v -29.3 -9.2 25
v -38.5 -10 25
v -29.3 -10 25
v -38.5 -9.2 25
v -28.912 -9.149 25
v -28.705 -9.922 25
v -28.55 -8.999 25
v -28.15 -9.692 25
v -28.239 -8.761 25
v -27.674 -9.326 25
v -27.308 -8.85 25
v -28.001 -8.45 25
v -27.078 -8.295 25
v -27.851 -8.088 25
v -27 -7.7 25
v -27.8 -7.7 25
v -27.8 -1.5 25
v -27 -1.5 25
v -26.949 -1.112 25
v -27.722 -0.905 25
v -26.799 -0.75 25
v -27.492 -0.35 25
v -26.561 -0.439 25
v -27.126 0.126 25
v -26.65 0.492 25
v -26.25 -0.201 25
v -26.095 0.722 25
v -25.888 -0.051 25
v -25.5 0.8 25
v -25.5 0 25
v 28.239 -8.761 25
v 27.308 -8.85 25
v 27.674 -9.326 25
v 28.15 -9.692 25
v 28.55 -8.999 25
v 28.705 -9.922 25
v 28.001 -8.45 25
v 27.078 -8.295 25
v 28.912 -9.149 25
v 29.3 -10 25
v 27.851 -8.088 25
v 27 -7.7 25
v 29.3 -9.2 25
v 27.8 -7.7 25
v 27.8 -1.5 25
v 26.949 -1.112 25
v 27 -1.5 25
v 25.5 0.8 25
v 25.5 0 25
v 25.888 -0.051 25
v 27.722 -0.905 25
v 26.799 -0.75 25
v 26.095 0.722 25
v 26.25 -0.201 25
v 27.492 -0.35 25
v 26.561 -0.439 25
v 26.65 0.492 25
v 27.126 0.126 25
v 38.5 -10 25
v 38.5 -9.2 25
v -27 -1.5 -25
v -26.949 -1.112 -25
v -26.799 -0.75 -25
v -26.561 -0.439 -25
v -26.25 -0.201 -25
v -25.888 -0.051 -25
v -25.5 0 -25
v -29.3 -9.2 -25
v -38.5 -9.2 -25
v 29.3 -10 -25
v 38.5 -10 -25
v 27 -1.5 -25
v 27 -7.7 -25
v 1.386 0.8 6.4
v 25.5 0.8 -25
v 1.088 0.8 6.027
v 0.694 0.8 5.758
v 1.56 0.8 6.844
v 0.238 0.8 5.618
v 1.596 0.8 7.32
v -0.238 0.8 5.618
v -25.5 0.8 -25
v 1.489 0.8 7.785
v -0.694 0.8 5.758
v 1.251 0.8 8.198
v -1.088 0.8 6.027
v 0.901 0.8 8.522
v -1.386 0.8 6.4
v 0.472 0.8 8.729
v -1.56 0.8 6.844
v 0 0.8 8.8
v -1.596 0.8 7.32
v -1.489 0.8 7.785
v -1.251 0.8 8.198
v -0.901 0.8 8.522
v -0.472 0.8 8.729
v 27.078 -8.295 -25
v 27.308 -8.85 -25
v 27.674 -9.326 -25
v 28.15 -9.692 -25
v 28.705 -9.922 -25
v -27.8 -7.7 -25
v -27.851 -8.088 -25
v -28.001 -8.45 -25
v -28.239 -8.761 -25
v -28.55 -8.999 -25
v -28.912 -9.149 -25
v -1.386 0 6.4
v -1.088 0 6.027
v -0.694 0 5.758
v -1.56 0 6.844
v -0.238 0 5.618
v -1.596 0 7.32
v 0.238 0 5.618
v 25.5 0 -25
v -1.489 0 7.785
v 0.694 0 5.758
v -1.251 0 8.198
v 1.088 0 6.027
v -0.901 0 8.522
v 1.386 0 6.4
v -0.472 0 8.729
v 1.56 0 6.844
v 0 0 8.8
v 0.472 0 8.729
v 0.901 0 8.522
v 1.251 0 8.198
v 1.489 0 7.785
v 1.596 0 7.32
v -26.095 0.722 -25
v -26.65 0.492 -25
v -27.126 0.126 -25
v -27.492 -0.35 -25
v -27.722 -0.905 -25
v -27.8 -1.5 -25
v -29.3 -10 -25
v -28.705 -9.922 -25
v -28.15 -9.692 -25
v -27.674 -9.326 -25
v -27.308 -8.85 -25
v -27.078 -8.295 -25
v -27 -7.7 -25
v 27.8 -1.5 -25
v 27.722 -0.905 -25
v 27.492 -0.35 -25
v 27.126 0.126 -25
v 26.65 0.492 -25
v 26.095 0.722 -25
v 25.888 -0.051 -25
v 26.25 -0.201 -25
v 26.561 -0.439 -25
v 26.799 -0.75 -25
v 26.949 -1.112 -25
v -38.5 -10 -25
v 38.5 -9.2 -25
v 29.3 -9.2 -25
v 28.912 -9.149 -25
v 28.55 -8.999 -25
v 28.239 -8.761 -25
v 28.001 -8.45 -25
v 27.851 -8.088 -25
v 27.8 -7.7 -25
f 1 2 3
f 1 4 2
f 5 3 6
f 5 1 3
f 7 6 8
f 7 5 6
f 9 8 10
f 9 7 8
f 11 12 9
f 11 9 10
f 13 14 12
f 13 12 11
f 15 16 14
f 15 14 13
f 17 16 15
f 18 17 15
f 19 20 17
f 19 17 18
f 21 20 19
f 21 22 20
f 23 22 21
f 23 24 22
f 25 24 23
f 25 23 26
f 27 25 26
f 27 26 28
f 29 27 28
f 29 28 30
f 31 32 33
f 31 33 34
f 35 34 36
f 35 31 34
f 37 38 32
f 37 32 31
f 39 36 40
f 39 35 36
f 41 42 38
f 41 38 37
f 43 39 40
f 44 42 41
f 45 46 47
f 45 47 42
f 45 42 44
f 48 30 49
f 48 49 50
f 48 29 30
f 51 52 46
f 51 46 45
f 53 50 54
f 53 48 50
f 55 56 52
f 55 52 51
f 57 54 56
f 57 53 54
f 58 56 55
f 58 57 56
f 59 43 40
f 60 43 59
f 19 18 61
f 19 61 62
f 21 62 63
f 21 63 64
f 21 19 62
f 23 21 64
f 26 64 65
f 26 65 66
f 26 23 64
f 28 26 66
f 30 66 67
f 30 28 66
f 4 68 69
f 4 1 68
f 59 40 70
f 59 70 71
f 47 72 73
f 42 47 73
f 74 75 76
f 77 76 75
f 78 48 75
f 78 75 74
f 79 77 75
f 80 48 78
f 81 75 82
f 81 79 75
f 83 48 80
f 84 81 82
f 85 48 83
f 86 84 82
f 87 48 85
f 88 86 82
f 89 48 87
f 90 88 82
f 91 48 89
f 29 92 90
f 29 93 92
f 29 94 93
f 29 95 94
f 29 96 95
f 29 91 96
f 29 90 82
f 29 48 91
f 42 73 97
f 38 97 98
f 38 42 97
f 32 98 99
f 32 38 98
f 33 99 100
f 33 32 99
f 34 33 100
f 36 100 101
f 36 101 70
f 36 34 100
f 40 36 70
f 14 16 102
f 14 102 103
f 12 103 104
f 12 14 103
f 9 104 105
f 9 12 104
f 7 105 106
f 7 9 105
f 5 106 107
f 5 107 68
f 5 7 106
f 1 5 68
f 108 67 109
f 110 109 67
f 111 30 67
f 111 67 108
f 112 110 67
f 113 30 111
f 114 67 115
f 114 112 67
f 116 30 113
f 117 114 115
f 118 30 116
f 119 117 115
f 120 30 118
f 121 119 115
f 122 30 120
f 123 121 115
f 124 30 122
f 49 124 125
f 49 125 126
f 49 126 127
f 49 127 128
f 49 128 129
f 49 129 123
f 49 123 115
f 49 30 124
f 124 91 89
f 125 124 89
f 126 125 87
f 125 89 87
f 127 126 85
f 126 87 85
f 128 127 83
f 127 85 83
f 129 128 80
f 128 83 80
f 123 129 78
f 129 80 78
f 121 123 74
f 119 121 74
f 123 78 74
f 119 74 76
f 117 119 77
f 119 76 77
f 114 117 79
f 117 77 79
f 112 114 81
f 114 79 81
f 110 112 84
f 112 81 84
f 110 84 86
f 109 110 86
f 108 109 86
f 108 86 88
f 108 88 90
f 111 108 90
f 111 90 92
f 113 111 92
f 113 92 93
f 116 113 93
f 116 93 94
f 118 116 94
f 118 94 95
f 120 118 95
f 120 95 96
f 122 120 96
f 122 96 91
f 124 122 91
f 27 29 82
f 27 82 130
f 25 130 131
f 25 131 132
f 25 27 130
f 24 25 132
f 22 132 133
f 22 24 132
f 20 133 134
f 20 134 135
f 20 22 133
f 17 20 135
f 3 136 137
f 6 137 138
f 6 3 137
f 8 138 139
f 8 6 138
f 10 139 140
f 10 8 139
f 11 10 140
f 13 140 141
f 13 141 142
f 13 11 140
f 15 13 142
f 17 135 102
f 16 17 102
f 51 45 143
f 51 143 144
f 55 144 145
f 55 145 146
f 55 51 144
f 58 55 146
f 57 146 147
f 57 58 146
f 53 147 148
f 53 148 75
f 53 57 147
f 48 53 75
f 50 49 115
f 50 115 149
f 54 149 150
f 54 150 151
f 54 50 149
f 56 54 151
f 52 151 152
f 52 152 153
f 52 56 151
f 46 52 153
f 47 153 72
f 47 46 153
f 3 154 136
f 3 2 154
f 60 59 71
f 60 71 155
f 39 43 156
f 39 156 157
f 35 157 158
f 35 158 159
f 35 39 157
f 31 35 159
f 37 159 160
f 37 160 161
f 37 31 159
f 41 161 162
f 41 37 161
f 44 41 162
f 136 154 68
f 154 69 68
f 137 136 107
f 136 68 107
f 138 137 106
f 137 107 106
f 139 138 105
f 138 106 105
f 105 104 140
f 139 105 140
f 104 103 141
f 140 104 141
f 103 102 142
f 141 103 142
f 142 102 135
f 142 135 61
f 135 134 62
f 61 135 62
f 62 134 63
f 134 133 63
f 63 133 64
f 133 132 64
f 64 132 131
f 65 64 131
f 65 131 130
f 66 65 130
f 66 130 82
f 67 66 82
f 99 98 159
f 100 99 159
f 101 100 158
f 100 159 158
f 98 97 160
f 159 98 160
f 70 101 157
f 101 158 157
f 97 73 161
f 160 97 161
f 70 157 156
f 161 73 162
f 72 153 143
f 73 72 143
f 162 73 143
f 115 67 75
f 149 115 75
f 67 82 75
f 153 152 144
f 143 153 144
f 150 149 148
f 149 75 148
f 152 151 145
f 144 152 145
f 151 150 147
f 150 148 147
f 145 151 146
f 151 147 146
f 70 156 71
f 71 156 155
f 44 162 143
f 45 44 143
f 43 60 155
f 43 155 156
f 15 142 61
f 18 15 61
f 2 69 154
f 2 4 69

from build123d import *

# Parameters (mm, degrees)
BASE_FLANGE1_DEPTH = 25
SKETCH2_R          = 1.6
CUT_EXTRUDE1_DEPTH = 10


# Sheet-metal steps are written as plain solids
with BuildPart() as part:
    # Sketch1 → Base-Flange1 (new, symmetric)
    with BuildSketch(Plane.XY):
        with BuildLine():
            Line((-38.5, -10), (-29.3, -10))
            ThreePointArc((-29.3, -10), (-27.673654403, -9.326345597), (-27, -7.7))
            Line((-27, -7.7), (-27, -1.5))
            ThreePointArc((-27, -1.5), (-26.560660172, -0.439339828), (-25.5, 0))
            Line((-25.5, 0), (25.5, 0))
            ThreePointArc((25.5, 0), (26.560660172, -0.439339828), (27, -1.5))
            Line((27, -1.5), (27, -7.7))
            ThreePointArc((27, -7.7), (27.673654403, -9.326345597), (29.3, -10))
            Line((29.3, -10), (38.5, -10))
            Line((38.5, -10), (38.5, -9.2))
            Line((38.5, -9.2), (29.3, -9.2))
            ThreePointArc((29.3, -9.2), (28.239339828, -8.760660172), (27.8, -7.7))
            Line((27.8, -7.7), (27.8, -1.5))
            ThreePointArc((27.8, -1.5), (27.126345597, 0.126345597), (25.5, 0.8))
            Line((25.5, 0.8), (-25.5, 0.8))
            ThreePointArc((-25.5, 0.8), (-27.126345597, 0.126345597), (-27.8, -1.5))
            Line((-27.8, -1.5), (-27.8, -7.7))
            ThreePointArc((-27.8, -7.7), (-28.239339828, -8.760660172), (-29.3, -9.2))
            Line((-29.3, -9.2), (-38.5, -9.2))
            Line((-38.5, -9.2), (-38.5, -10))
        make_face()
    extrude(amount=BASE_FLANGE1_DEPTH, both=True)

    # Sketch2 → Cut-Extrude1 (cut)
    with BuildSketch(Plane(origin=(0, 0.8, 0), x_dir=(1, 0, 0), z_dir=(0, 1, 0))):
        with Locations(Location((0, -7.2, 0), (0, 0, 270))):
            Circle(SKETCH2_R)
    extrude(amount=-CUT_EXTRUDE1_DEPTH, mode=Mode.SUBTRACT)


solid = part.part
